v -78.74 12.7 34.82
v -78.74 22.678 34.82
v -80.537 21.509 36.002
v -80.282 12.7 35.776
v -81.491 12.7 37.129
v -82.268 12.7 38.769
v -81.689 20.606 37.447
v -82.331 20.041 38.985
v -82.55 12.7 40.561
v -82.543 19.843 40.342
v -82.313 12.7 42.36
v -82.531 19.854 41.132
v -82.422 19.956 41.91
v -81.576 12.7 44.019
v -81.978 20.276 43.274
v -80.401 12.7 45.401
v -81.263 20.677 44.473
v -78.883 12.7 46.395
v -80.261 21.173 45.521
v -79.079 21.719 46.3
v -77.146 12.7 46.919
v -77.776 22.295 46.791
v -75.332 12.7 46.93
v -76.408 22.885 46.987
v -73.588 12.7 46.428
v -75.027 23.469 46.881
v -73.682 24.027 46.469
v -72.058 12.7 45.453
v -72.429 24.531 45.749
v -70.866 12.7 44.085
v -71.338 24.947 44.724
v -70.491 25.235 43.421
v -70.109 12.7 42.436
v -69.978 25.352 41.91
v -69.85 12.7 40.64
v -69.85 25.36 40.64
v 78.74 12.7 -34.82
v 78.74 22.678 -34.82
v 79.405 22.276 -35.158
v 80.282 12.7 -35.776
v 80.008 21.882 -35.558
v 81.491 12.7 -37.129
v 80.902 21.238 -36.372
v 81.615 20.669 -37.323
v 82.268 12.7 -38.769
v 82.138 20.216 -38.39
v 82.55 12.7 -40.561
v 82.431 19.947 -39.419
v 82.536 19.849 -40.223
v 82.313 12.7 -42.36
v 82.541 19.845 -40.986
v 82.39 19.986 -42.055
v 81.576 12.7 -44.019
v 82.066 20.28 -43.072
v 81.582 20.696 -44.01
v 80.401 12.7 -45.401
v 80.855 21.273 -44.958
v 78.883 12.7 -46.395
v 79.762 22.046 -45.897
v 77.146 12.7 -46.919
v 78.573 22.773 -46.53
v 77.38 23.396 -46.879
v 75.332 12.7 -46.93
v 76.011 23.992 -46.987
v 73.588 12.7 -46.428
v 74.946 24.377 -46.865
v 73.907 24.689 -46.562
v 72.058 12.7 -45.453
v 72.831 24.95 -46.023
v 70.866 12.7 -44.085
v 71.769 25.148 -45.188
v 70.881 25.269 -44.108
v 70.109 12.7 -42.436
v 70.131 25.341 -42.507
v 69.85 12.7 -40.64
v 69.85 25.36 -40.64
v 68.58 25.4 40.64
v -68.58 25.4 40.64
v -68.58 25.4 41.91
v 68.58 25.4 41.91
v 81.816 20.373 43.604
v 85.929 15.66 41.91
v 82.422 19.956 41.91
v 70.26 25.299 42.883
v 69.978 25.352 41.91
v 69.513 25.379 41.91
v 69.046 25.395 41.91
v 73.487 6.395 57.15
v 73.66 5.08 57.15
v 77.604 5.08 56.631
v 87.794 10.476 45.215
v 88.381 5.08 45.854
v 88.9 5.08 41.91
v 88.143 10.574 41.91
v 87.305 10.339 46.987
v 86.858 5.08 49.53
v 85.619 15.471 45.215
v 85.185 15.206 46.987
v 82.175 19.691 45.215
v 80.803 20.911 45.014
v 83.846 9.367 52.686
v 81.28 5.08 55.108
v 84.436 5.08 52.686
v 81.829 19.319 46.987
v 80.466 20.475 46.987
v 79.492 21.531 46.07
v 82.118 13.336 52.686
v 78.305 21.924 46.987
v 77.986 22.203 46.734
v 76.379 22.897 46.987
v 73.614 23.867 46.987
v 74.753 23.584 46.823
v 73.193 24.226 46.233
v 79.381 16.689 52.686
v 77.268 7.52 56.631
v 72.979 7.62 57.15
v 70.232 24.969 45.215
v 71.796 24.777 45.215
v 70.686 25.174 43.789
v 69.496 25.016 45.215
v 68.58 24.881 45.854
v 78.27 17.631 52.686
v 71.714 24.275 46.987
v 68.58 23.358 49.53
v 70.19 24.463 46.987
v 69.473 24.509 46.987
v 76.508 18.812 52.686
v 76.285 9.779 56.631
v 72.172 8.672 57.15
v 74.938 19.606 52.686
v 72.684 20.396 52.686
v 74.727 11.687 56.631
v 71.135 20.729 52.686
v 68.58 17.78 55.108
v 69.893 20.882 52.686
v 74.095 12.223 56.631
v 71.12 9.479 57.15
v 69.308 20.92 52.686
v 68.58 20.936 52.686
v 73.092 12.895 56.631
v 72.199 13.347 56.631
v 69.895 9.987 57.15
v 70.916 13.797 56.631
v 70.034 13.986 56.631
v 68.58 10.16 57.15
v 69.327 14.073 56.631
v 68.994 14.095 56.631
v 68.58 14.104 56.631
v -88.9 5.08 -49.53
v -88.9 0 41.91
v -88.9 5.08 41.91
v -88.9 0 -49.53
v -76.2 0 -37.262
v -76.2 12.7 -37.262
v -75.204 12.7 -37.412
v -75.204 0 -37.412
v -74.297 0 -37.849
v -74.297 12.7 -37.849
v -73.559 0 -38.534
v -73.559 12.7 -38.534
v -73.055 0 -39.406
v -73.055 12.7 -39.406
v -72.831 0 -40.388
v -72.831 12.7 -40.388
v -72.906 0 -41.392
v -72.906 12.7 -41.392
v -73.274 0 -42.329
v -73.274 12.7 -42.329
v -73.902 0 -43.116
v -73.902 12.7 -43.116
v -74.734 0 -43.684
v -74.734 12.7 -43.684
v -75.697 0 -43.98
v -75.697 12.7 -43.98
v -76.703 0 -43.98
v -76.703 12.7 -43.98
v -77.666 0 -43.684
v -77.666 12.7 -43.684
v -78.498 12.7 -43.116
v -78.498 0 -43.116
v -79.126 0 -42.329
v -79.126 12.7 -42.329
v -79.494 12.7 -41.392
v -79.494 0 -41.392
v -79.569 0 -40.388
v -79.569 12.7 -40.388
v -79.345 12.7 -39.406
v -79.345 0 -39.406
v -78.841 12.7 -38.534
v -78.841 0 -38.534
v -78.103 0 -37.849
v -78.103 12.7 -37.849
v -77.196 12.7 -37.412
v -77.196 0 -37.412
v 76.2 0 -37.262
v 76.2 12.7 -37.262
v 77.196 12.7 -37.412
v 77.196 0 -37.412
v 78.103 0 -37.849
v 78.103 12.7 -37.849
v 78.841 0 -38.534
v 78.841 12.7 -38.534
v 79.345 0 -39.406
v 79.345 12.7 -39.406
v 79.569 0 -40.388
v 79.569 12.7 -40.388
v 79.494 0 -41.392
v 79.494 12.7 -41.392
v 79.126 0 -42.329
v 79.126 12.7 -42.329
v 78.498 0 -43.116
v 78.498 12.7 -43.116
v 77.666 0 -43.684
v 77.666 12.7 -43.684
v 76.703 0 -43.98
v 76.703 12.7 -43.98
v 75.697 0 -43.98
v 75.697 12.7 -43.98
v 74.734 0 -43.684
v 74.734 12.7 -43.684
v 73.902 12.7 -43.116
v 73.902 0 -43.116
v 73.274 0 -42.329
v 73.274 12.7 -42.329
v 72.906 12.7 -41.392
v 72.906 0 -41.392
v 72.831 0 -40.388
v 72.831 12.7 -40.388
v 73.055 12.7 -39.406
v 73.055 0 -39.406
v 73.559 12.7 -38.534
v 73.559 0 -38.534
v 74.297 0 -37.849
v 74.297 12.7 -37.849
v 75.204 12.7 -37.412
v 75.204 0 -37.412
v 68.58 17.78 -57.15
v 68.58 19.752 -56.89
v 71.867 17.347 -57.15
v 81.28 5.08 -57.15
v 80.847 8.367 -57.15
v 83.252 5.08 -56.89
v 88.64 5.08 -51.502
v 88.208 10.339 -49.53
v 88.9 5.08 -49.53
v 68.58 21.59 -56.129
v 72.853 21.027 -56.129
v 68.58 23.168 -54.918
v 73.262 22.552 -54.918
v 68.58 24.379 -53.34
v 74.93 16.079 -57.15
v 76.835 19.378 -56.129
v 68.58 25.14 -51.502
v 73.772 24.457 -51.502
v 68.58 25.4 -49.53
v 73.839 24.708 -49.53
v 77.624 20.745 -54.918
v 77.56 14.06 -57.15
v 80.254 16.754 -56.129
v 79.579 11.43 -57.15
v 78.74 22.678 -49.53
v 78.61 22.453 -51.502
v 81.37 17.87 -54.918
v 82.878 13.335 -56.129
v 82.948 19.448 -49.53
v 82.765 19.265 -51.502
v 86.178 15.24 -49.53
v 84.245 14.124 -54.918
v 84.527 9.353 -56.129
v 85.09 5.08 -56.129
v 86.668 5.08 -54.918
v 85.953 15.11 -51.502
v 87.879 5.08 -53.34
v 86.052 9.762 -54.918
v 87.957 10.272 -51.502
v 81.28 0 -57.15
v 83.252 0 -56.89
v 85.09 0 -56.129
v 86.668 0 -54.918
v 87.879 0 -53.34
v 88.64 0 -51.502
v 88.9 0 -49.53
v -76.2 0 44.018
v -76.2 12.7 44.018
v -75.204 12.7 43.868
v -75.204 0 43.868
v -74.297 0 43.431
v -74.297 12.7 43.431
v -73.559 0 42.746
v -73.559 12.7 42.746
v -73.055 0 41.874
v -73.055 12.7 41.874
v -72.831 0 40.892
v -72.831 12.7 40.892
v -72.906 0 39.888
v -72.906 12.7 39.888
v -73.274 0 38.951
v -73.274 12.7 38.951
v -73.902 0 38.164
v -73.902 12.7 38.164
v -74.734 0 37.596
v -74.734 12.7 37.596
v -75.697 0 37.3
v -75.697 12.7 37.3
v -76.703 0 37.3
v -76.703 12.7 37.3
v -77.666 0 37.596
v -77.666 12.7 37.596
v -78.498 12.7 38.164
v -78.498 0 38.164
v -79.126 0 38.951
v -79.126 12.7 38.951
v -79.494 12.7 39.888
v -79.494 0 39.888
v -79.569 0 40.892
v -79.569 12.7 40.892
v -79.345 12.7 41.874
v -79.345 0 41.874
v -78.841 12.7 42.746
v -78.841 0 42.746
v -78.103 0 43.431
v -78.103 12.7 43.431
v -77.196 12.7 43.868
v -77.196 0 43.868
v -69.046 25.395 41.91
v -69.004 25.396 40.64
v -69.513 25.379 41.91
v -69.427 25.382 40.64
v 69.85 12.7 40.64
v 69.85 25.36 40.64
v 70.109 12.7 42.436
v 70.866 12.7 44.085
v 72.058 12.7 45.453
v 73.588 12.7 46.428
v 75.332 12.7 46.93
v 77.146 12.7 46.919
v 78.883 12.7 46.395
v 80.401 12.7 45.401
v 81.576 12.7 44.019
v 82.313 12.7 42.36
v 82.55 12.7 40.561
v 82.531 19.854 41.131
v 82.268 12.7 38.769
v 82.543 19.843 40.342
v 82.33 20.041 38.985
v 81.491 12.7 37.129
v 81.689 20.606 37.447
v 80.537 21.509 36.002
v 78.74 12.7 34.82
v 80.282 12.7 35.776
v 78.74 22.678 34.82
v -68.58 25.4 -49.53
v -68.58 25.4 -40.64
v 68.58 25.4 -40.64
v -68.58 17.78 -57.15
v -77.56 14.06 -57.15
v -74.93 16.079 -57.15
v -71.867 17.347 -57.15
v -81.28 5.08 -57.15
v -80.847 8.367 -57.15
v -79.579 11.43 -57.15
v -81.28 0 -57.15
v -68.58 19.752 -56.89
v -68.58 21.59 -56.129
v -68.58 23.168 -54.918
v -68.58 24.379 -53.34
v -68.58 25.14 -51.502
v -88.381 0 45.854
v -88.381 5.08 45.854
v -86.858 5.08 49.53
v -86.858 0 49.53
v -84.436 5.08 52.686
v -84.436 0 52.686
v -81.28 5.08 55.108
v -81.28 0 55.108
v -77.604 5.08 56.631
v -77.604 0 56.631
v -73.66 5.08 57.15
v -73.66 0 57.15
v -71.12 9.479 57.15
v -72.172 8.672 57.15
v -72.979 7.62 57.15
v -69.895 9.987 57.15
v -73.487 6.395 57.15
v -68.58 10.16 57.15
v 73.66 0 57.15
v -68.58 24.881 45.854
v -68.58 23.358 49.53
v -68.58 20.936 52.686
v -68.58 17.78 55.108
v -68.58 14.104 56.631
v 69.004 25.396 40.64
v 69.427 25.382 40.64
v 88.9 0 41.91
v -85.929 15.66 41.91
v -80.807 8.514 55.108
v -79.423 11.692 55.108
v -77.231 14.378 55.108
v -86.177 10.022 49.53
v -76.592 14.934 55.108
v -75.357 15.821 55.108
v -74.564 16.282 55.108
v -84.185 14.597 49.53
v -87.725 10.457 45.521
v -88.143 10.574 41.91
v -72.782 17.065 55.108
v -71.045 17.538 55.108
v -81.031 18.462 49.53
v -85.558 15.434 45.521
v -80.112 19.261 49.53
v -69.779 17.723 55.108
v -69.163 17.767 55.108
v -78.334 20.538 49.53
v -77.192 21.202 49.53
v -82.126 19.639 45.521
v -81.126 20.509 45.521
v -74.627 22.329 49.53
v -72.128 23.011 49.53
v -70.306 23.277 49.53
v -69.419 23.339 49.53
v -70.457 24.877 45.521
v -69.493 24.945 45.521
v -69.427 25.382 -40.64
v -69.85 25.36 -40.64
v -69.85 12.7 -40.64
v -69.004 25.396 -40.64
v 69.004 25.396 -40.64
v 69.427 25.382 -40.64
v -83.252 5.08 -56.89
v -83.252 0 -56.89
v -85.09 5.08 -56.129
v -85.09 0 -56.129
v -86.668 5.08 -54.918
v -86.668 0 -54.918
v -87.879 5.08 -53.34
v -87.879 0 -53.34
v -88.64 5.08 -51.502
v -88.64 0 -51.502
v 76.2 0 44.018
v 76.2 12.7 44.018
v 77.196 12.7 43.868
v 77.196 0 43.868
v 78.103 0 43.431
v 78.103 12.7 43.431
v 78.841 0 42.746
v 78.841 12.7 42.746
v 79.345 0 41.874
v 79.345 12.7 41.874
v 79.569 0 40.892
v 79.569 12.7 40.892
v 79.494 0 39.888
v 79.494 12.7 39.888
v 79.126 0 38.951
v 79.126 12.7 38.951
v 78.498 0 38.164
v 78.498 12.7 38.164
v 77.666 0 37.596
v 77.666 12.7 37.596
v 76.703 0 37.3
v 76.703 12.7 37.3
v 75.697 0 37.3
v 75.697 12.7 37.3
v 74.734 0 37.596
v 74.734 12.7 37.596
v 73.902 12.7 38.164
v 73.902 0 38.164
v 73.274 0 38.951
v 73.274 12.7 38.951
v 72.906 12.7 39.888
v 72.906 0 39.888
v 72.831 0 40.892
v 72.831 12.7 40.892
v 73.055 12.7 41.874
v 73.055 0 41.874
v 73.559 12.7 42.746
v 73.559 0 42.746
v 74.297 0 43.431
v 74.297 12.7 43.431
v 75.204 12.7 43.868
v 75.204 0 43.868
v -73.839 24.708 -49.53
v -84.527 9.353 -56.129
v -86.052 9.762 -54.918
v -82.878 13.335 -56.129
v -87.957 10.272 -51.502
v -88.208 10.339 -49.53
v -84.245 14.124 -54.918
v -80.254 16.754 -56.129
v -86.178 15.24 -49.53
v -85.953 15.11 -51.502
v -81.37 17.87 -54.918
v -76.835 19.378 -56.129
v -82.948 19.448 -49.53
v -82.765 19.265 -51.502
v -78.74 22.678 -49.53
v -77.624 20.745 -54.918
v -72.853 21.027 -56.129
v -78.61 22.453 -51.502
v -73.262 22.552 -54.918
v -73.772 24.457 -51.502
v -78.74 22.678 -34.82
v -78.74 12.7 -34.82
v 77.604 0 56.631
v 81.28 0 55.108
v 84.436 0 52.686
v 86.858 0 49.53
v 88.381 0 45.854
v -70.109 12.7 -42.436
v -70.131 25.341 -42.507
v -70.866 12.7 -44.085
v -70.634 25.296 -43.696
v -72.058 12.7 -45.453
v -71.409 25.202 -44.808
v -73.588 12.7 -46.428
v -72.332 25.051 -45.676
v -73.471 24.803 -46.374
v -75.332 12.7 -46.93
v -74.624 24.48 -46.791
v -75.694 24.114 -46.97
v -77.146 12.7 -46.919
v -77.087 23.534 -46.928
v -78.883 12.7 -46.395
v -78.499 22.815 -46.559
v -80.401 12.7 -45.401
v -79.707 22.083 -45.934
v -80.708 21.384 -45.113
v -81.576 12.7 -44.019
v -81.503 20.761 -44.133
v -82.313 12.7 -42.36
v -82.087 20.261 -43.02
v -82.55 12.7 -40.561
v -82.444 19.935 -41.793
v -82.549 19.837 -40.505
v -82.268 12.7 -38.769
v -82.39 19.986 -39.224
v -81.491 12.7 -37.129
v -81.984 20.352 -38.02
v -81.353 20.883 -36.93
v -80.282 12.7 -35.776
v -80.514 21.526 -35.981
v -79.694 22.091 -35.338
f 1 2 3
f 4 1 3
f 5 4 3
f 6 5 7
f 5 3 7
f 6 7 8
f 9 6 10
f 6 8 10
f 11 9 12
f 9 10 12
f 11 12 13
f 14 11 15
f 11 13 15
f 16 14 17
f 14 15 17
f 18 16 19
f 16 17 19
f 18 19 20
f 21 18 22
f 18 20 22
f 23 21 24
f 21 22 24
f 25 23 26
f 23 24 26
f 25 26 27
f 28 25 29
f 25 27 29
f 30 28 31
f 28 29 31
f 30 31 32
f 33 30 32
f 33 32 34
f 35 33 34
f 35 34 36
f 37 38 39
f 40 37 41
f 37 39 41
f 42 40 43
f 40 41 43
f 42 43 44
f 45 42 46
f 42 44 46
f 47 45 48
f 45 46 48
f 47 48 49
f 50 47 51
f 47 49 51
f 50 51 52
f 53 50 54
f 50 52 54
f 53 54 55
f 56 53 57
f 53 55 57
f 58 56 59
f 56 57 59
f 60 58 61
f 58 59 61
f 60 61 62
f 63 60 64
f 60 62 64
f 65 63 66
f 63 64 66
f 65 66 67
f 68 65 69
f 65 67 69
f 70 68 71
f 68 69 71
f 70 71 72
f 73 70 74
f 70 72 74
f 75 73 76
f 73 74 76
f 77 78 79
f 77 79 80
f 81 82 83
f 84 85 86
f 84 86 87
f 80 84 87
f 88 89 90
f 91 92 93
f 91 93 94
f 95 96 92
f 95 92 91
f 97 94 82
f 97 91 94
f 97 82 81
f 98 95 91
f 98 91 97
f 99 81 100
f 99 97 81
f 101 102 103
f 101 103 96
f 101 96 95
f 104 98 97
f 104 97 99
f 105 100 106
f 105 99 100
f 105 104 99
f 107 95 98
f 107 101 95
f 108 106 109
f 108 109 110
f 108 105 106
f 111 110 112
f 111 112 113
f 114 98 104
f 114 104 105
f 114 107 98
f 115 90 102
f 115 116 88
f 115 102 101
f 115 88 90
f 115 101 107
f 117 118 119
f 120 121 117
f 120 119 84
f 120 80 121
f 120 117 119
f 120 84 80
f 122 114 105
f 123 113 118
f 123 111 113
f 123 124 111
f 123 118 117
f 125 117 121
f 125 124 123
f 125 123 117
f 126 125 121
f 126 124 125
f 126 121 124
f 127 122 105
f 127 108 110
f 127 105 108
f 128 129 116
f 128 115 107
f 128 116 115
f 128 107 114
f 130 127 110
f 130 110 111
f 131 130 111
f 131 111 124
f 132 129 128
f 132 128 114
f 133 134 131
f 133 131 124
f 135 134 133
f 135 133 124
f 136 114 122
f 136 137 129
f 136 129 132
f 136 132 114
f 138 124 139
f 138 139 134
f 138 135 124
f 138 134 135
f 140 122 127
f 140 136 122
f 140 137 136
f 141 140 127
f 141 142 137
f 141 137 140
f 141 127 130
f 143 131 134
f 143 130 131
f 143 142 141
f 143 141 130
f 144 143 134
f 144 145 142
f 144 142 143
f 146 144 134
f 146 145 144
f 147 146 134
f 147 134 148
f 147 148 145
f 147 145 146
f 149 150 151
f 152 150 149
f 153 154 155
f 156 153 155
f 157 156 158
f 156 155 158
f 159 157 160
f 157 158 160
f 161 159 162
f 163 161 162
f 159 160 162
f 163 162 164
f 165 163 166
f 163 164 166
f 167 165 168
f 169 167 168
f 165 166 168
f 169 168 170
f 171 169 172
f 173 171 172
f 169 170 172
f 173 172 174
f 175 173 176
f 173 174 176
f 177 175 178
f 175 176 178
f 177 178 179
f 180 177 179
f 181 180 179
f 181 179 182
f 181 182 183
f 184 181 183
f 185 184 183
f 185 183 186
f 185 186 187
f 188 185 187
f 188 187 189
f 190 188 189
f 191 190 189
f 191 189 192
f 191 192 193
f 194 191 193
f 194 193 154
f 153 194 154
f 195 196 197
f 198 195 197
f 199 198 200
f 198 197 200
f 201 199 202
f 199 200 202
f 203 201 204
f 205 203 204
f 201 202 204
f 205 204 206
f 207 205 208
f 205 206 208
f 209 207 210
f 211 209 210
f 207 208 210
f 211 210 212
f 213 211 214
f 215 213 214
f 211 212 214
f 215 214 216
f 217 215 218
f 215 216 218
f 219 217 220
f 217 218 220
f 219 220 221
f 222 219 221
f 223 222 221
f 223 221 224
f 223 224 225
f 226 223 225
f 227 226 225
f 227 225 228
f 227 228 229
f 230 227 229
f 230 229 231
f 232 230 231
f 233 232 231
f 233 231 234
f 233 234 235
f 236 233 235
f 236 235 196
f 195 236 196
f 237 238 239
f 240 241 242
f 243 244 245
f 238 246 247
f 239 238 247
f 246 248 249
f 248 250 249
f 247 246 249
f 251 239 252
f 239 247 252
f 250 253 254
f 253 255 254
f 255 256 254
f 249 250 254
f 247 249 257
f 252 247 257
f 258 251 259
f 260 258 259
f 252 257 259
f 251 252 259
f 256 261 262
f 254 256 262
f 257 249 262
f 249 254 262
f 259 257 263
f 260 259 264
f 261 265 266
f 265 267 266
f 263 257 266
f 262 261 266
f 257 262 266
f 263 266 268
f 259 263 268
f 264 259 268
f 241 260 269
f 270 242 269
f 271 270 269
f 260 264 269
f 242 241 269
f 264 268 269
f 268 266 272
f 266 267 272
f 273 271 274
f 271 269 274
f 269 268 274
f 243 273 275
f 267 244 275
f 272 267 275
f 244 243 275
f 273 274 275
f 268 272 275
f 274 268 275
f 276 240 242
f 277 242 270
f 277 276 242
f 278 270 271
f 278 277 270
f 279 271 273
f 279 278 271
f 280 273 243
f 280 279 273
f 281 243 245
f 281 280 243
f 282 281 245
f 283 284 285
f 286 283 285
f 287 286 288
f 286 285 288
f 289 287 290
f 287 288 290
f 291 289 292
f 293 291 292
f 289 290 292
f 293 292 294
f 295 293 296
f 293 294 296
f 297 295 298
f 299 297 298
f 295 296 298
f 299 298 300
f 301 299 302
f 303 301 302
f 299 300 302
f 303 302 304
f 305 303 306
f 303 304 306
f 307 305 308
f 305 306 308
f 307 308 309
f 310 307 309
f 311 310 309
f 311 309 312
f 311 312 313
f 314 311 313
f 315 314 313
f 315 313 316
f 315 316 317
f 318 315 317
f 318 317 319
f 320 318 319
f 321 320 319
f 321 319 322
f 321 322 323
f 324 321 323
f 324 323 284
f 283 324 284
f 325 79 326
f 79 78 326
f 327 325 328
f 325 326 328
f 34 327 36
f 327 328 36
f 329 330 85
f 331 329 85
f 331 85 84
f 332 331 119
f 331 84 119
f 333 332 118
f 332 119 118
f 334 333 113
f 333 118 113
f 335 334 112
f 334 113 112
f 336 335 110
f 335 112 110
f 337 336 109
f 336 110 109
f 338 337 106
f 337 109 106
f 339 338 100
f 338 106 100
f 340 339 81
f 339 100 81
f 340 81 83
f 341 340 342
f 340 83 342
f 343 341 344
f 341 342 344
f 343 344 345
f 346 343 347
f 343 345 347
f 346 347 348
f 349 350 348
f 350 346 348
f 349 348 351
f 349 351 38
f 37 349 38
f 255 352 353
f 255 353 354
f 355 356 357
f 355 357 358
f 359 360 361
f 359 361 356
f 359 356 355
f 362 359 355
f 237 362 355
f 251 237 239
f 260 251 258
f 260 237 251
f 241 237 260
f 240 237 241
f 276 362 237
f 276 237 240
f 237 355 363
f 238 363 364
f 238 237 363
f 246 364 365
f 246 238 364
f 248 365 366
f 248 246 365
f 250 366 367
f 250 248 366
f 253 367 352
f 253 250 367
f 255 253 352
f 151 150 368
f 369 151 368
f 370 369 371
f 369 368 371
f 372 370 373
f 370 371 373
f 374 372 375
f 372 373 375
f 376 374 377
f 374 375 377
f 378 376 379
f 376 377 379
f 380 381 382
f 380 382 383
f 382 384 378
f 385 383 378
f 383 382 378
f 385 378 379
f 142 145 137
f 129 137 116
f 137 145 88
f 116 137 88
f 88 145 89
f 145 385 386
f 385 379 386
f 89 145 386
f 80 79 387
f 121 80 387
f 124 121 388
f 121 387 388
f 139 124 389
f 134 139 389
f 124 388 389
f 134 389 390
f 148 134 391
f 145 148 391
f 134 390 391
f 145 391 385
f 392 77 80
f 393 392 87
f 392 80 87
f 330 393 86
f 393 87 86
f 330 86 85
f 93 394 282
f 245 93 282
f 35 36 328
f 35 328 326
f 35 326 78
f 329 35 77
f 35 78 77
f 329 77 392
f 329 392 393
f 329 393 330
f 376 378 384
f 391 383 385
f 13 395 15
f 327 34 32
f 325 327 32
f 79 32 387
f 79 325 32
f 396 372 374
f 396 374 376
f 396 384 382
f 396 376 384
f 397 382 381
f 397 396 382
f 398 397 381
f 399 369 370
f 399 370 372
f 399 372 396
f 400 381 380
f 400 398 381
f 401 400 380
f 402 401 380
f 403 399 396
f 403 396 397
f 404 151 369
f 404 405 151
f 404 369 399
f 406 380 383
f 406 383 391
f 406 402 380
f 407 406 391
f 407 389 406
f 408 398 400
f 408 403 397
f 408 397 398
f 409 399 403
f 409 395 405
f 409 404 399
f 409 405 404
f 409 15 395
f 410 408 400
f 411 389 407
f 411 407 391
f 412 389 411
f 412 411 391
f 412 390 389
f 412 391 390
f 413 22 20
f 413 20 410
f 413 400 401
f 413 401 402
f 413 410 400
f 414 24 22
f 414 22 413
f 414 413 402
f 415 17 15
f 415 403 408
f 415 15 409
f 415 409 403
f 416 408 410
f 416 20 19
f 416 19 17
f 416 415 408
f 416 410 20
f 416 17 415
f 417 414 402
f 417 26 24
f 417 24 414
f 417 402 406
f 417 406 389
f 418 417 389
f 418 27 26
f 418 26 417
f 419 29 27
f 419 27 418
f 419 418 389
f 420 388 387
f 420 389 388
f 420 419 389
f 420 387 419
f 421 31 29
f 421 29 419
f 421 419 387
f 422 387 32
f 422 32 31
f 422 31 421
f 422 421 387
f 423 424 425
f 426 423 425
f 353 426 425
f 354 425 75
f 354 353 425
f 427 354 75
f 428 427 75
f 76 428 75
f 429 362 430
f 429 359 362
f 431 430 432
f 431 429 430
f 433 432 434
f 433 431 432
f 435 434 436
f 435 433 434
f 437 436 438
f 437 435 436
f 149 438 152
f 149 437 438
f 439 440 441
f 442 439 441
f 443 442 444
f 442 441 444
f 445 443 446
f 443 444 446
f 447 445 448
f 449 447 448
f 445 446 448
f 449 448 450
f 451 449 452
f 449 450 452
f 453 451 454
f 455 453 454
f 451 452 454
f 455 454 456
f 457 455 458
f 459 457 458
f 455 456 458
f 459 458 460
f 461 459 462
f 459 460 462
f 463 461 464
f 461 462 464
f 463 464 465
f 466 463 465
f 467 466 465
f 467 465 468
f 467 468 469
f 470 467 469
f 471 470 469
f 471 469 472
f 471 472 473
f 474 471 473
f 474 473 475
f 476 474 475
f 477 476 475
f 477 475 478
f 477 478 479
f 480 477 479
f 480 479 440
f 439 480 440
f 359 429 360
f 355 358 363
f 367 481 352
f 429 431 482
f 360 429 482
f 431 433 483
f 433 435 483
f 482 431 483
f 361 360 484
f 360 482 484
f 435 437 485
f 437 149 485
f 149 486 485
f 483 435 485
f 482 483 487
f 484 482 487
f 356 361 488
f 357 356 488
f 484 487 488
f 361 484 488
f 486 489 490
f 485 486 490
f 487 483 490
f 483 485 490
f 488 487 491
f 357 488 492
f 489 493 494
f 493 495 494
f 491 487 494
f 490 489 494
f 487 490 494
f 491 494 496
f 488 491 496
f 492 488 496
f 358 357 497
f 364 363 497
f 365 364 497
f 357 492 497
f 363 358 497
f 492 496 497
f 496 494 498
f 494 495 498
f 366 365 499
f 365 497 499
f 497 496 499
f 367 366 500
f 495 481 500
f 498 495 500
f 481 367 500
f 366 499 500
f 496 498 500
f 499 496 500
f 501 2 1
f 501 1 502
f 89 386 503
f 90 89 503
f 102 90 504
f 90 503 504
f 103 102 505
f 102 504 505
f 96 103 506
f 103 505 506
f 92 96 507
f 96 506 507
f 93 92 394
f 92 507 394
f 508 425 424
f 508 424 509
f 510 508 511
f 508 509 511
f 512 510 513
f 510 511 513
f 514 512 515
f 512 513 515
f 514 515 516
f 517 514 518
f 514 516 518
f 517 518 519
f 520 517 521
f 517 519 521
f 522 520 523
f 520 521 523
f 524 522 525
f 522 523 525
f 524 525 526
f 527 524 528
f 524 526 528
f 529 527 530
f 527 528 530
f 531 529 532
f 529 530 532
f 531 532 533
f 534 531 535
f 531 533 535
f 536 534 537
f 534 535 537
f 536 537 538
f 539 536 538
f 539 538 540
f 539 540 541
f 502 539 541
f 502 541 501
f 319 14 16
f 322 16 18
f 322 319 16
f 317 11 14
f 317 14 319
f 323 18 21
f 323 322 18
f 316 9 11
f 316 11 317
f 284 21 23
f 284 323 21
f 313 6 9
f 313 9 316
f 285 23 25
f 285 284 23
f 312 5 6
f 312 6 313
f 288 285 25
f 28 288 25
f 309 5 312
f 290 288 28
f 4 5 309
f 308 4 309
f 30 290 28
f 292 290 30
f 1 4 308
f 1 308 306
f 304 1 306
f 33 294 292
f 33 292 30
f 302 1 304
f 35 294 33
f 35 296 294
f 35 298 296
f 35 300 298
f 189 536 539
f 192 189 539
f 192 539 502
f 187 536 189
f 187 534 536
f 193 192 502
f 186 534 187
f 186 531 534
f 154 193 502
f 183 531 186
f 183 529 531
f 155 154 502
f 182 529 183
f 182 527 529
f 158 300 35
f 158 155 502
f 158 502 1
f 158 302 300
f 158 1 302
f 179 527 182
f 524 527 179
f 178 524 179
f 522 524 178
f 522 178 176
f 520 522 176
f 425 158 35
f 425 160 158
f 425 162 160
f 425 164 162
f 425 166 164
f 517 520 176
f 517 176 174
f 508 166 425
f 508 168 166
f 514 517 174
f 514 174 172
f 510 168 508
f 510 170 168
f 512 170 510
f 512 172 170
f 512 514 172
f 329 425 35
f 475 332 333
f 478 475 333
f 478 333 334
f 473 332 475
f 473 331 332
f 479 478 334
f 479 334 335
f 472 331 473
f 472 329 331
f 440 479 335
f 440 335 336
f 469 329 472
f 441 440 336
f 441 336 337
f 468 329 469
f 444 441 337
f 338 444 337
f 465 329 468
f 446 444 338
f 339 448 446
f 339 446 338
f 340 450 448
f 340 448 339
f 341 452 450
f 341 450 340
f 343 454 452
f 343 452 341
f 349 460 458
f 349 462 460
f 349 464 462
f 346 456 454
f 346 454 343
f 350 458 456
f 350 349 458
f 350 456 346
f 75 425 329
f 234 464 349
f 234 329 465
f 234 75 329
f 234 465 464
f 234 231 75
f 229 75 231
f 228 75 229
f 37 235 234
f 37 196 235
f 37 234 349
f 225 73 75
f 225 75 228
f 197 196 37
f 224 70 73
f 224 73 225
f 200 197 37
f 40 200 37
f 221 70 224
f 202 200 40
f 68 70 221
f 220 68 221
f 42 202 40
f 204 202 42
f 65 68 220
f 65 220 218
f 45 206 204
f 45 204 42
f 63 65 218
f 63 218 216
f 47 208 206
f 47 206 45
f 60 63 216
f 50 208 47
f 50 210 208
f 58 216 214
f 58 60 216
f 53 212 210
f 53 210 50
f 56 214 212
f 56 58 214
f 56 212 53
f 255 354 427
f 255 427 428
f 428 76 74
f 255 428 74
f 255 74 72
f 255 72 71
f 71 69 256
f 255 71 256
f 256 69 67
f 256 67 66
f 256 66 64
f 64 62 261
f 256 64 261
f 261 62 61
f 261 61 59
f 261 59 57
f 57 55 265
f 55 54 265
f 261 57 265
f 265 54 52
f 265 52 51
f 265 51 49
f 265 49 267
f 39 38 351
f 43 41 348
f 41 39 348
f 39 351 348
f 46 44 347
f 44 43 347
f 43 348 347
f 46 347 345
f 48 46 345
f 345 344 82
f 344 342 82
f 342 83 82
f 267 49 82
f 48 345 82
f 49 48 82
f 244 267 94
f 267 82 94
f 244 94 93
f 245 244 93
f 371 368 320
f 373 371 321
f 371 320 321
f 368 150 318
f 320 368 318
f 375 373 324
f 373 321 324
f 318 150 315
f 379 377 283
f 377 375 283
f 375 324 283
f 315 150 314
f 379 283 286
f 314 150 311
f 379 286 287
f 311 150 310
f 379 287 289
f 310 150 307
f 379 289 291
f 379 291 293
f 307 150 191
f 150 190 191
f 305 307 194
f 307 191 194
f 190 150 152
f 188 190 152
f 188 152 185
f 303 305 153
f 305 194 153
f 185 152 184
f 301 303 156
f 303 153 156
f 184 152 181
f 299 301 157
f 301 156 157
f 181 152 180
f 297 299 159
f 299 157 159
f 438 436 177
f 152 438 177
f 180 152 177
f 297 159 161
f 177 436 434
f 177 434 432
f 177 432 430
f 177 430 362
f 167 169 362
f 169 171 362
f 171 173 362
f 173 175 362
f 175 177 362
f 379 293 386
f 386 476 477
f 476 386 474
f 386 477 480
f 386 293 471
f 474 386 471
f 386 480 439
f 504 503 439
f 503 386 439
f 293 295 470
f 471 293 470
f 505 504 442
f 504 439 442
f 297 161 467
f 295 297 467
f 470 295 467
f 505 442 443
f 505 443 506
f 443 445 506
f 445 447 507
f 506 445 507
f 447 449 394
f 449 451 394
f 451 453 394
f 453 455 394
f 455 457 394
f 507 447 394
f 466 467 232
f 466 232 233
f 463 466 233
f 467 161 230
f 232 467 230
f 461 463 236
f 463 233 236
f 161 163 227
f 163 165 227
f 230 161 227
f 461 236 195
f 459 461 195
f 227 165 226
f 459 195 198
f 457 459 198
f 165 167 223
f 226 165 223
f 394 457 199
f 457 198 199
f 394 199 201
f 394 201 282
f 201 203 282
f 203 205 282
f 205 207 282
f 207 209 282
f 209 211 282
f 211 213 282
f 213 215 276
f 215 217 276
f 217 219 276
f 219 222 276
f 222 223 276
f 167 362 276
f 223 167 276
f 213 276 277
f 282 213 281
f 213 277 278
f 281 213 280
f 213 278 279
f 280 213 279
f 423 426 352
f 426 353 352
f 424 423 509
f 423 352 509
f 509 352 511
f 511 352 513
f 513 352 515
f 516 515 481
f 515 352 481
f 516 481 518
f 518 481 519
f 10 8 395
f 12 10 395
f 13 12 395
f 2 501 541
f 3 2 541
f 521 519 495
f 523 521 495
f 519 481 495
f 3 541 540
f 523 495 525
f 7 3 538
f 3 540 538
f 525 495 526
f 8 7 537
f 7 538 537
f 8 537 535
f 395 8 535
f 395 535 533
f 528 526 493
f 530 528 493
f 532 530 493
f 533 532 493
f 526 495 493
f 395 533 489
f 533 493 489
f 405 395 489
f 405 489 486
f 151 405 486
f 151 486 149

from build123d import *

# Parameters (mm, degrees)
SKETCH1_W           = 177.8
SKETCH1_H           = 114.3
BOSS_EXTRUDE1_DEPTH = 25.4
SKETCH3_R           = 3.3782
CUT_EXTRUDE2_DEPTH  = 109.694491581
SKETCH4_W           = 157.48
SKETCH4_H           = 81.28
CUT_EXTRUDE3_DEPTH  = 12.7
SKETCH3_3_R         = 6.35
SKETCH3_3_R_2       = 3.3782
CUT_EXTRUDE4_DEPTH  = 12.7
FILLET4_R           = 20.32
FILLET7_R           = 15.24
FILLET8_R           = 7.62


with BuildPart() as part:
    # Sketch1 → Boss-Extrude1 (new body)
    with BuildSketch(Plane(origin=(0, 0, 0), x_dir=(1, 0, 0), z_dir=(0, 1, 0))):
        Rectangle(SKETCH1_W, SKETCH1_H)
    extrude(amount=BOSS_EXTRUDE1_DEPTH)

    # Sketch3 → Cut-Extrude2 (cut, through all)
    with BuildSketch(Plane(origin=(0, 25.4, 0), x_dir=(1, 0, 0), z_dir=(0, 1, 0))):
        with Locations(Location((76.2, -40.64, 0), (0, 0, 270))):
            Circle(SKETCH3_R)
        with Locations(Location((76.2, 40.64, 0), (0, 0, 270))):
            Circle(SKETCH3_R)
        with Locations(Location((-76.2, -40.64, 0), (0, 0, 270))):
            Circle(SKETCH3_R)
        with Locations(Location((-76.2, 40.64, 0), (0, 0, 270))):
            Circle(SKETCH3_R)
    extrude(amount=-CUT_EXTRUDE2_DEPTH, mode=Mode.SUBTRACT)

    # Sketch4 → Cut-Extrude3 (cut)
    with BuildSketch(Plane(origin=(0, 25.4, 0), x_dir=(1, 0, 0), z_dir=(0, 1, 0))):
        Rectangle(SKETCH4_W, SKETCH4_H)
    extrude(amount=-CUT_EXTRUDE3_DEPTH, mode=Mode.SUBTRACT)

    # Sketch3<3> → Cut-Extrude4 (cut)
    # profile 1 of 4: a face of its own
    with BuildSketch(Plane(origin=(0, 25.4, 0), x_dir=(1, 0, 0), z_dir=(0, 1, 0))):
        with Locations((76.2, 40.64)):
            Circle(SKETCH3_3_R)
        with Locations(Location((76.2, 40.64, 0), (0, 0, 270))):
            Circle(SKETCH3_3_R_2, mode=Mode.SUBTRACT)
    # profile 2 of 4: a face of its own
    with BuildSketch(Plane(origin=(0, 25.4, 0), x_dir=(1, 0, 0), z_dir=(0, 1, 0))):
        with Locations((76.2, -40.64)):
            Circle(SKETCH3_3_R)
        with Locations(Location((76.2, -40.64, 0), (0, 0, 270))):
            Circle(SKETCH3_3_R_2, mode=Mode.SUBTRACT)
    # profile 3 of 4: a face of its own
    with BuildSketch(Plane(origin=(0, 25.4, 0), x_dir=(1, 0, 0), z_dir=(0, 1, 0))):
        with Locations((-76.2, -40.64)):
            Circle(SKETCH3_3_R)
        with Locations(Location((-76.2, -40.64, 0), (0, 0, 270))):
            Circle(SKETCH3_3_R_2, mode=Mode.SUBTRACT)
    # profile 4 of 4: a face of its own
    with BuildSketch(Plane(origin=(0, 25.4, 0), x_dir=(1, 0, 0), z_dir=(0, 1, 0))):
        with Locations((-76.2, 40.64)):
            Circle(SKETCH3_3_R)
        with Locations(Location((-76.2, 40.64, 0), (0, 0, 270))):
            Circle(SKETCH3_3_R_2, mode=Mode.SUBTRACT)
    extrude(amount=-CUT_EXTRUDE4_DEPTH, mode=Mode.SUBTRACT)

    # Fillet4
    # the kernel refuses this fillet: 20.32 mm, written as the material it takes off along each edge
    with BuildSketch(Plane(origin=(88.9, 25.4, 107.95), x_dir=(-1, 0, 0), z_dir=(0, 0, -1)), Plane(origin=(-88.9, 25.4, -107.95), x_dir=(1, 0, 0), z_dir=(0, 0, 1))) as fillet4_piece_1:
        with BuildLine():
            CenterArc((FILLET4_R, -FILLET4_R), FILLET4_R, 90, 90)
            Line((0, -FILLET4_R), (0, 0))
            Line((0, 0), (FILLET4_R, 0))
        make_face()
    extrude(amount=215.9, mode=Mode.SUBTRACT)

    # Fillet7
    # the kernel refuses this fillet: 15.24 mm, written as the material it takes off along each edge
    with BuildSketch(Plane(origin=(-68.58, 25.4, 57.15), x_dir=(0, -1, 0), z_dir=(1, 0, 0))) as fillet7_piece_1:
        with BuildLine():
            CenterArc((FILLET7_R, FILLET7_R), FILLET7_R, 180, 90)
            Line((0, FILLET7_R), (0, 0))
            Line((0, 0), (FILLET7_R, 0))
        make_face()
    extrude(amount=137.16, mode=Mode.SUBTRACT)
    with BuildSketch(Plane(origin=(88.9, -38.1, 57.15), x_dir=(-1, 0, 0), z_dir=(0, 1, 0))) as fillet7_piece_2:
        with BuildLine():
            CenterArc((FILLET7_R, -FILLET7_R), FILLET7_R, 90, 90)
            Line((0, -FILLET7_R), (0, 0))
            Line((0, 0), (FILLET7_R, 0))
        make_face()
    extrude(amount=43.18, mode=Mode.SUBTRACT)
    with BuildSketch(Plane(origin=(-88.9, -38.1, 57.15), x_dir=(1, 0, 0), z_dir=(0, 1, 0))) as fillet7_piece_3:
        with BuildLine():
            CenterArc((FILLET7_R, FILLET7_R), FILLET7_R, 180, 90)
            Line((0, FILLET7_R), (0, 0))
            Line((0, 0), (FILLET7_R, 0))
        make_face()
    extrude(amount=43.18, mode=Mode.SUBTRACT)
    with BuildSketch(Plane(origin=(-68.58, 5.08, 57.15), x_dir=(-1, 0, 0), z_dir=(0, -1, 0))) as fillet7_piece_4:
        with BuildLine():
            CenterArc((20.32 - FILLET7_R, FILLET7_R), FILLET7_R, 270, 90)
            Line((20.32, FILLET7_R), (20.32, 0))
            Line((20.32, 0), (20.32 - FILLET7_R, 0))
        make_face()
    revolve(axis=Axis((-68.58, 5.08, 57.15), (0, 0, -1)), revolution_arc=90, mode=Mode.SUBTRACT)
    with BuildSketch(Plane(origin=(68.58, 5.08, 57.15), x_dir=(1, 0, 0), z_dir=(0, -1, 0))) as fillet7_piece_5:
        with BuildLine():
            CenterArc((20.32 - FILLET7_R, -FILLET7_R), FILLET7_R, 0, 90)
            Line((20.32, -FILLET7_R), (20.32, 0))
            Line((20.32, 0), (20.32 - FILLET7_R, 0))
        make_face()
    revolve(axis=Axis((68.58, 5.08, 57.15), (0, 0, 1)), revolution_arc=90, mode=Mode.SUBTRACT)

    # Fillet8
    fillet8_edges = [part.edges().sort_by_distance(p)[0] for p in [
        (0, 25.4, -57.15),
        (-88.9, 2.54, -57.15),
        (88.9, 2.54, -57.15),
        (-82.948409794, 19.448409794, -57.15),
        (82.948409794, 19.448409794, -57.15),
    ]]
    fillet(fillet8_edges, radius=FILLET8_R)


solid = part.part
